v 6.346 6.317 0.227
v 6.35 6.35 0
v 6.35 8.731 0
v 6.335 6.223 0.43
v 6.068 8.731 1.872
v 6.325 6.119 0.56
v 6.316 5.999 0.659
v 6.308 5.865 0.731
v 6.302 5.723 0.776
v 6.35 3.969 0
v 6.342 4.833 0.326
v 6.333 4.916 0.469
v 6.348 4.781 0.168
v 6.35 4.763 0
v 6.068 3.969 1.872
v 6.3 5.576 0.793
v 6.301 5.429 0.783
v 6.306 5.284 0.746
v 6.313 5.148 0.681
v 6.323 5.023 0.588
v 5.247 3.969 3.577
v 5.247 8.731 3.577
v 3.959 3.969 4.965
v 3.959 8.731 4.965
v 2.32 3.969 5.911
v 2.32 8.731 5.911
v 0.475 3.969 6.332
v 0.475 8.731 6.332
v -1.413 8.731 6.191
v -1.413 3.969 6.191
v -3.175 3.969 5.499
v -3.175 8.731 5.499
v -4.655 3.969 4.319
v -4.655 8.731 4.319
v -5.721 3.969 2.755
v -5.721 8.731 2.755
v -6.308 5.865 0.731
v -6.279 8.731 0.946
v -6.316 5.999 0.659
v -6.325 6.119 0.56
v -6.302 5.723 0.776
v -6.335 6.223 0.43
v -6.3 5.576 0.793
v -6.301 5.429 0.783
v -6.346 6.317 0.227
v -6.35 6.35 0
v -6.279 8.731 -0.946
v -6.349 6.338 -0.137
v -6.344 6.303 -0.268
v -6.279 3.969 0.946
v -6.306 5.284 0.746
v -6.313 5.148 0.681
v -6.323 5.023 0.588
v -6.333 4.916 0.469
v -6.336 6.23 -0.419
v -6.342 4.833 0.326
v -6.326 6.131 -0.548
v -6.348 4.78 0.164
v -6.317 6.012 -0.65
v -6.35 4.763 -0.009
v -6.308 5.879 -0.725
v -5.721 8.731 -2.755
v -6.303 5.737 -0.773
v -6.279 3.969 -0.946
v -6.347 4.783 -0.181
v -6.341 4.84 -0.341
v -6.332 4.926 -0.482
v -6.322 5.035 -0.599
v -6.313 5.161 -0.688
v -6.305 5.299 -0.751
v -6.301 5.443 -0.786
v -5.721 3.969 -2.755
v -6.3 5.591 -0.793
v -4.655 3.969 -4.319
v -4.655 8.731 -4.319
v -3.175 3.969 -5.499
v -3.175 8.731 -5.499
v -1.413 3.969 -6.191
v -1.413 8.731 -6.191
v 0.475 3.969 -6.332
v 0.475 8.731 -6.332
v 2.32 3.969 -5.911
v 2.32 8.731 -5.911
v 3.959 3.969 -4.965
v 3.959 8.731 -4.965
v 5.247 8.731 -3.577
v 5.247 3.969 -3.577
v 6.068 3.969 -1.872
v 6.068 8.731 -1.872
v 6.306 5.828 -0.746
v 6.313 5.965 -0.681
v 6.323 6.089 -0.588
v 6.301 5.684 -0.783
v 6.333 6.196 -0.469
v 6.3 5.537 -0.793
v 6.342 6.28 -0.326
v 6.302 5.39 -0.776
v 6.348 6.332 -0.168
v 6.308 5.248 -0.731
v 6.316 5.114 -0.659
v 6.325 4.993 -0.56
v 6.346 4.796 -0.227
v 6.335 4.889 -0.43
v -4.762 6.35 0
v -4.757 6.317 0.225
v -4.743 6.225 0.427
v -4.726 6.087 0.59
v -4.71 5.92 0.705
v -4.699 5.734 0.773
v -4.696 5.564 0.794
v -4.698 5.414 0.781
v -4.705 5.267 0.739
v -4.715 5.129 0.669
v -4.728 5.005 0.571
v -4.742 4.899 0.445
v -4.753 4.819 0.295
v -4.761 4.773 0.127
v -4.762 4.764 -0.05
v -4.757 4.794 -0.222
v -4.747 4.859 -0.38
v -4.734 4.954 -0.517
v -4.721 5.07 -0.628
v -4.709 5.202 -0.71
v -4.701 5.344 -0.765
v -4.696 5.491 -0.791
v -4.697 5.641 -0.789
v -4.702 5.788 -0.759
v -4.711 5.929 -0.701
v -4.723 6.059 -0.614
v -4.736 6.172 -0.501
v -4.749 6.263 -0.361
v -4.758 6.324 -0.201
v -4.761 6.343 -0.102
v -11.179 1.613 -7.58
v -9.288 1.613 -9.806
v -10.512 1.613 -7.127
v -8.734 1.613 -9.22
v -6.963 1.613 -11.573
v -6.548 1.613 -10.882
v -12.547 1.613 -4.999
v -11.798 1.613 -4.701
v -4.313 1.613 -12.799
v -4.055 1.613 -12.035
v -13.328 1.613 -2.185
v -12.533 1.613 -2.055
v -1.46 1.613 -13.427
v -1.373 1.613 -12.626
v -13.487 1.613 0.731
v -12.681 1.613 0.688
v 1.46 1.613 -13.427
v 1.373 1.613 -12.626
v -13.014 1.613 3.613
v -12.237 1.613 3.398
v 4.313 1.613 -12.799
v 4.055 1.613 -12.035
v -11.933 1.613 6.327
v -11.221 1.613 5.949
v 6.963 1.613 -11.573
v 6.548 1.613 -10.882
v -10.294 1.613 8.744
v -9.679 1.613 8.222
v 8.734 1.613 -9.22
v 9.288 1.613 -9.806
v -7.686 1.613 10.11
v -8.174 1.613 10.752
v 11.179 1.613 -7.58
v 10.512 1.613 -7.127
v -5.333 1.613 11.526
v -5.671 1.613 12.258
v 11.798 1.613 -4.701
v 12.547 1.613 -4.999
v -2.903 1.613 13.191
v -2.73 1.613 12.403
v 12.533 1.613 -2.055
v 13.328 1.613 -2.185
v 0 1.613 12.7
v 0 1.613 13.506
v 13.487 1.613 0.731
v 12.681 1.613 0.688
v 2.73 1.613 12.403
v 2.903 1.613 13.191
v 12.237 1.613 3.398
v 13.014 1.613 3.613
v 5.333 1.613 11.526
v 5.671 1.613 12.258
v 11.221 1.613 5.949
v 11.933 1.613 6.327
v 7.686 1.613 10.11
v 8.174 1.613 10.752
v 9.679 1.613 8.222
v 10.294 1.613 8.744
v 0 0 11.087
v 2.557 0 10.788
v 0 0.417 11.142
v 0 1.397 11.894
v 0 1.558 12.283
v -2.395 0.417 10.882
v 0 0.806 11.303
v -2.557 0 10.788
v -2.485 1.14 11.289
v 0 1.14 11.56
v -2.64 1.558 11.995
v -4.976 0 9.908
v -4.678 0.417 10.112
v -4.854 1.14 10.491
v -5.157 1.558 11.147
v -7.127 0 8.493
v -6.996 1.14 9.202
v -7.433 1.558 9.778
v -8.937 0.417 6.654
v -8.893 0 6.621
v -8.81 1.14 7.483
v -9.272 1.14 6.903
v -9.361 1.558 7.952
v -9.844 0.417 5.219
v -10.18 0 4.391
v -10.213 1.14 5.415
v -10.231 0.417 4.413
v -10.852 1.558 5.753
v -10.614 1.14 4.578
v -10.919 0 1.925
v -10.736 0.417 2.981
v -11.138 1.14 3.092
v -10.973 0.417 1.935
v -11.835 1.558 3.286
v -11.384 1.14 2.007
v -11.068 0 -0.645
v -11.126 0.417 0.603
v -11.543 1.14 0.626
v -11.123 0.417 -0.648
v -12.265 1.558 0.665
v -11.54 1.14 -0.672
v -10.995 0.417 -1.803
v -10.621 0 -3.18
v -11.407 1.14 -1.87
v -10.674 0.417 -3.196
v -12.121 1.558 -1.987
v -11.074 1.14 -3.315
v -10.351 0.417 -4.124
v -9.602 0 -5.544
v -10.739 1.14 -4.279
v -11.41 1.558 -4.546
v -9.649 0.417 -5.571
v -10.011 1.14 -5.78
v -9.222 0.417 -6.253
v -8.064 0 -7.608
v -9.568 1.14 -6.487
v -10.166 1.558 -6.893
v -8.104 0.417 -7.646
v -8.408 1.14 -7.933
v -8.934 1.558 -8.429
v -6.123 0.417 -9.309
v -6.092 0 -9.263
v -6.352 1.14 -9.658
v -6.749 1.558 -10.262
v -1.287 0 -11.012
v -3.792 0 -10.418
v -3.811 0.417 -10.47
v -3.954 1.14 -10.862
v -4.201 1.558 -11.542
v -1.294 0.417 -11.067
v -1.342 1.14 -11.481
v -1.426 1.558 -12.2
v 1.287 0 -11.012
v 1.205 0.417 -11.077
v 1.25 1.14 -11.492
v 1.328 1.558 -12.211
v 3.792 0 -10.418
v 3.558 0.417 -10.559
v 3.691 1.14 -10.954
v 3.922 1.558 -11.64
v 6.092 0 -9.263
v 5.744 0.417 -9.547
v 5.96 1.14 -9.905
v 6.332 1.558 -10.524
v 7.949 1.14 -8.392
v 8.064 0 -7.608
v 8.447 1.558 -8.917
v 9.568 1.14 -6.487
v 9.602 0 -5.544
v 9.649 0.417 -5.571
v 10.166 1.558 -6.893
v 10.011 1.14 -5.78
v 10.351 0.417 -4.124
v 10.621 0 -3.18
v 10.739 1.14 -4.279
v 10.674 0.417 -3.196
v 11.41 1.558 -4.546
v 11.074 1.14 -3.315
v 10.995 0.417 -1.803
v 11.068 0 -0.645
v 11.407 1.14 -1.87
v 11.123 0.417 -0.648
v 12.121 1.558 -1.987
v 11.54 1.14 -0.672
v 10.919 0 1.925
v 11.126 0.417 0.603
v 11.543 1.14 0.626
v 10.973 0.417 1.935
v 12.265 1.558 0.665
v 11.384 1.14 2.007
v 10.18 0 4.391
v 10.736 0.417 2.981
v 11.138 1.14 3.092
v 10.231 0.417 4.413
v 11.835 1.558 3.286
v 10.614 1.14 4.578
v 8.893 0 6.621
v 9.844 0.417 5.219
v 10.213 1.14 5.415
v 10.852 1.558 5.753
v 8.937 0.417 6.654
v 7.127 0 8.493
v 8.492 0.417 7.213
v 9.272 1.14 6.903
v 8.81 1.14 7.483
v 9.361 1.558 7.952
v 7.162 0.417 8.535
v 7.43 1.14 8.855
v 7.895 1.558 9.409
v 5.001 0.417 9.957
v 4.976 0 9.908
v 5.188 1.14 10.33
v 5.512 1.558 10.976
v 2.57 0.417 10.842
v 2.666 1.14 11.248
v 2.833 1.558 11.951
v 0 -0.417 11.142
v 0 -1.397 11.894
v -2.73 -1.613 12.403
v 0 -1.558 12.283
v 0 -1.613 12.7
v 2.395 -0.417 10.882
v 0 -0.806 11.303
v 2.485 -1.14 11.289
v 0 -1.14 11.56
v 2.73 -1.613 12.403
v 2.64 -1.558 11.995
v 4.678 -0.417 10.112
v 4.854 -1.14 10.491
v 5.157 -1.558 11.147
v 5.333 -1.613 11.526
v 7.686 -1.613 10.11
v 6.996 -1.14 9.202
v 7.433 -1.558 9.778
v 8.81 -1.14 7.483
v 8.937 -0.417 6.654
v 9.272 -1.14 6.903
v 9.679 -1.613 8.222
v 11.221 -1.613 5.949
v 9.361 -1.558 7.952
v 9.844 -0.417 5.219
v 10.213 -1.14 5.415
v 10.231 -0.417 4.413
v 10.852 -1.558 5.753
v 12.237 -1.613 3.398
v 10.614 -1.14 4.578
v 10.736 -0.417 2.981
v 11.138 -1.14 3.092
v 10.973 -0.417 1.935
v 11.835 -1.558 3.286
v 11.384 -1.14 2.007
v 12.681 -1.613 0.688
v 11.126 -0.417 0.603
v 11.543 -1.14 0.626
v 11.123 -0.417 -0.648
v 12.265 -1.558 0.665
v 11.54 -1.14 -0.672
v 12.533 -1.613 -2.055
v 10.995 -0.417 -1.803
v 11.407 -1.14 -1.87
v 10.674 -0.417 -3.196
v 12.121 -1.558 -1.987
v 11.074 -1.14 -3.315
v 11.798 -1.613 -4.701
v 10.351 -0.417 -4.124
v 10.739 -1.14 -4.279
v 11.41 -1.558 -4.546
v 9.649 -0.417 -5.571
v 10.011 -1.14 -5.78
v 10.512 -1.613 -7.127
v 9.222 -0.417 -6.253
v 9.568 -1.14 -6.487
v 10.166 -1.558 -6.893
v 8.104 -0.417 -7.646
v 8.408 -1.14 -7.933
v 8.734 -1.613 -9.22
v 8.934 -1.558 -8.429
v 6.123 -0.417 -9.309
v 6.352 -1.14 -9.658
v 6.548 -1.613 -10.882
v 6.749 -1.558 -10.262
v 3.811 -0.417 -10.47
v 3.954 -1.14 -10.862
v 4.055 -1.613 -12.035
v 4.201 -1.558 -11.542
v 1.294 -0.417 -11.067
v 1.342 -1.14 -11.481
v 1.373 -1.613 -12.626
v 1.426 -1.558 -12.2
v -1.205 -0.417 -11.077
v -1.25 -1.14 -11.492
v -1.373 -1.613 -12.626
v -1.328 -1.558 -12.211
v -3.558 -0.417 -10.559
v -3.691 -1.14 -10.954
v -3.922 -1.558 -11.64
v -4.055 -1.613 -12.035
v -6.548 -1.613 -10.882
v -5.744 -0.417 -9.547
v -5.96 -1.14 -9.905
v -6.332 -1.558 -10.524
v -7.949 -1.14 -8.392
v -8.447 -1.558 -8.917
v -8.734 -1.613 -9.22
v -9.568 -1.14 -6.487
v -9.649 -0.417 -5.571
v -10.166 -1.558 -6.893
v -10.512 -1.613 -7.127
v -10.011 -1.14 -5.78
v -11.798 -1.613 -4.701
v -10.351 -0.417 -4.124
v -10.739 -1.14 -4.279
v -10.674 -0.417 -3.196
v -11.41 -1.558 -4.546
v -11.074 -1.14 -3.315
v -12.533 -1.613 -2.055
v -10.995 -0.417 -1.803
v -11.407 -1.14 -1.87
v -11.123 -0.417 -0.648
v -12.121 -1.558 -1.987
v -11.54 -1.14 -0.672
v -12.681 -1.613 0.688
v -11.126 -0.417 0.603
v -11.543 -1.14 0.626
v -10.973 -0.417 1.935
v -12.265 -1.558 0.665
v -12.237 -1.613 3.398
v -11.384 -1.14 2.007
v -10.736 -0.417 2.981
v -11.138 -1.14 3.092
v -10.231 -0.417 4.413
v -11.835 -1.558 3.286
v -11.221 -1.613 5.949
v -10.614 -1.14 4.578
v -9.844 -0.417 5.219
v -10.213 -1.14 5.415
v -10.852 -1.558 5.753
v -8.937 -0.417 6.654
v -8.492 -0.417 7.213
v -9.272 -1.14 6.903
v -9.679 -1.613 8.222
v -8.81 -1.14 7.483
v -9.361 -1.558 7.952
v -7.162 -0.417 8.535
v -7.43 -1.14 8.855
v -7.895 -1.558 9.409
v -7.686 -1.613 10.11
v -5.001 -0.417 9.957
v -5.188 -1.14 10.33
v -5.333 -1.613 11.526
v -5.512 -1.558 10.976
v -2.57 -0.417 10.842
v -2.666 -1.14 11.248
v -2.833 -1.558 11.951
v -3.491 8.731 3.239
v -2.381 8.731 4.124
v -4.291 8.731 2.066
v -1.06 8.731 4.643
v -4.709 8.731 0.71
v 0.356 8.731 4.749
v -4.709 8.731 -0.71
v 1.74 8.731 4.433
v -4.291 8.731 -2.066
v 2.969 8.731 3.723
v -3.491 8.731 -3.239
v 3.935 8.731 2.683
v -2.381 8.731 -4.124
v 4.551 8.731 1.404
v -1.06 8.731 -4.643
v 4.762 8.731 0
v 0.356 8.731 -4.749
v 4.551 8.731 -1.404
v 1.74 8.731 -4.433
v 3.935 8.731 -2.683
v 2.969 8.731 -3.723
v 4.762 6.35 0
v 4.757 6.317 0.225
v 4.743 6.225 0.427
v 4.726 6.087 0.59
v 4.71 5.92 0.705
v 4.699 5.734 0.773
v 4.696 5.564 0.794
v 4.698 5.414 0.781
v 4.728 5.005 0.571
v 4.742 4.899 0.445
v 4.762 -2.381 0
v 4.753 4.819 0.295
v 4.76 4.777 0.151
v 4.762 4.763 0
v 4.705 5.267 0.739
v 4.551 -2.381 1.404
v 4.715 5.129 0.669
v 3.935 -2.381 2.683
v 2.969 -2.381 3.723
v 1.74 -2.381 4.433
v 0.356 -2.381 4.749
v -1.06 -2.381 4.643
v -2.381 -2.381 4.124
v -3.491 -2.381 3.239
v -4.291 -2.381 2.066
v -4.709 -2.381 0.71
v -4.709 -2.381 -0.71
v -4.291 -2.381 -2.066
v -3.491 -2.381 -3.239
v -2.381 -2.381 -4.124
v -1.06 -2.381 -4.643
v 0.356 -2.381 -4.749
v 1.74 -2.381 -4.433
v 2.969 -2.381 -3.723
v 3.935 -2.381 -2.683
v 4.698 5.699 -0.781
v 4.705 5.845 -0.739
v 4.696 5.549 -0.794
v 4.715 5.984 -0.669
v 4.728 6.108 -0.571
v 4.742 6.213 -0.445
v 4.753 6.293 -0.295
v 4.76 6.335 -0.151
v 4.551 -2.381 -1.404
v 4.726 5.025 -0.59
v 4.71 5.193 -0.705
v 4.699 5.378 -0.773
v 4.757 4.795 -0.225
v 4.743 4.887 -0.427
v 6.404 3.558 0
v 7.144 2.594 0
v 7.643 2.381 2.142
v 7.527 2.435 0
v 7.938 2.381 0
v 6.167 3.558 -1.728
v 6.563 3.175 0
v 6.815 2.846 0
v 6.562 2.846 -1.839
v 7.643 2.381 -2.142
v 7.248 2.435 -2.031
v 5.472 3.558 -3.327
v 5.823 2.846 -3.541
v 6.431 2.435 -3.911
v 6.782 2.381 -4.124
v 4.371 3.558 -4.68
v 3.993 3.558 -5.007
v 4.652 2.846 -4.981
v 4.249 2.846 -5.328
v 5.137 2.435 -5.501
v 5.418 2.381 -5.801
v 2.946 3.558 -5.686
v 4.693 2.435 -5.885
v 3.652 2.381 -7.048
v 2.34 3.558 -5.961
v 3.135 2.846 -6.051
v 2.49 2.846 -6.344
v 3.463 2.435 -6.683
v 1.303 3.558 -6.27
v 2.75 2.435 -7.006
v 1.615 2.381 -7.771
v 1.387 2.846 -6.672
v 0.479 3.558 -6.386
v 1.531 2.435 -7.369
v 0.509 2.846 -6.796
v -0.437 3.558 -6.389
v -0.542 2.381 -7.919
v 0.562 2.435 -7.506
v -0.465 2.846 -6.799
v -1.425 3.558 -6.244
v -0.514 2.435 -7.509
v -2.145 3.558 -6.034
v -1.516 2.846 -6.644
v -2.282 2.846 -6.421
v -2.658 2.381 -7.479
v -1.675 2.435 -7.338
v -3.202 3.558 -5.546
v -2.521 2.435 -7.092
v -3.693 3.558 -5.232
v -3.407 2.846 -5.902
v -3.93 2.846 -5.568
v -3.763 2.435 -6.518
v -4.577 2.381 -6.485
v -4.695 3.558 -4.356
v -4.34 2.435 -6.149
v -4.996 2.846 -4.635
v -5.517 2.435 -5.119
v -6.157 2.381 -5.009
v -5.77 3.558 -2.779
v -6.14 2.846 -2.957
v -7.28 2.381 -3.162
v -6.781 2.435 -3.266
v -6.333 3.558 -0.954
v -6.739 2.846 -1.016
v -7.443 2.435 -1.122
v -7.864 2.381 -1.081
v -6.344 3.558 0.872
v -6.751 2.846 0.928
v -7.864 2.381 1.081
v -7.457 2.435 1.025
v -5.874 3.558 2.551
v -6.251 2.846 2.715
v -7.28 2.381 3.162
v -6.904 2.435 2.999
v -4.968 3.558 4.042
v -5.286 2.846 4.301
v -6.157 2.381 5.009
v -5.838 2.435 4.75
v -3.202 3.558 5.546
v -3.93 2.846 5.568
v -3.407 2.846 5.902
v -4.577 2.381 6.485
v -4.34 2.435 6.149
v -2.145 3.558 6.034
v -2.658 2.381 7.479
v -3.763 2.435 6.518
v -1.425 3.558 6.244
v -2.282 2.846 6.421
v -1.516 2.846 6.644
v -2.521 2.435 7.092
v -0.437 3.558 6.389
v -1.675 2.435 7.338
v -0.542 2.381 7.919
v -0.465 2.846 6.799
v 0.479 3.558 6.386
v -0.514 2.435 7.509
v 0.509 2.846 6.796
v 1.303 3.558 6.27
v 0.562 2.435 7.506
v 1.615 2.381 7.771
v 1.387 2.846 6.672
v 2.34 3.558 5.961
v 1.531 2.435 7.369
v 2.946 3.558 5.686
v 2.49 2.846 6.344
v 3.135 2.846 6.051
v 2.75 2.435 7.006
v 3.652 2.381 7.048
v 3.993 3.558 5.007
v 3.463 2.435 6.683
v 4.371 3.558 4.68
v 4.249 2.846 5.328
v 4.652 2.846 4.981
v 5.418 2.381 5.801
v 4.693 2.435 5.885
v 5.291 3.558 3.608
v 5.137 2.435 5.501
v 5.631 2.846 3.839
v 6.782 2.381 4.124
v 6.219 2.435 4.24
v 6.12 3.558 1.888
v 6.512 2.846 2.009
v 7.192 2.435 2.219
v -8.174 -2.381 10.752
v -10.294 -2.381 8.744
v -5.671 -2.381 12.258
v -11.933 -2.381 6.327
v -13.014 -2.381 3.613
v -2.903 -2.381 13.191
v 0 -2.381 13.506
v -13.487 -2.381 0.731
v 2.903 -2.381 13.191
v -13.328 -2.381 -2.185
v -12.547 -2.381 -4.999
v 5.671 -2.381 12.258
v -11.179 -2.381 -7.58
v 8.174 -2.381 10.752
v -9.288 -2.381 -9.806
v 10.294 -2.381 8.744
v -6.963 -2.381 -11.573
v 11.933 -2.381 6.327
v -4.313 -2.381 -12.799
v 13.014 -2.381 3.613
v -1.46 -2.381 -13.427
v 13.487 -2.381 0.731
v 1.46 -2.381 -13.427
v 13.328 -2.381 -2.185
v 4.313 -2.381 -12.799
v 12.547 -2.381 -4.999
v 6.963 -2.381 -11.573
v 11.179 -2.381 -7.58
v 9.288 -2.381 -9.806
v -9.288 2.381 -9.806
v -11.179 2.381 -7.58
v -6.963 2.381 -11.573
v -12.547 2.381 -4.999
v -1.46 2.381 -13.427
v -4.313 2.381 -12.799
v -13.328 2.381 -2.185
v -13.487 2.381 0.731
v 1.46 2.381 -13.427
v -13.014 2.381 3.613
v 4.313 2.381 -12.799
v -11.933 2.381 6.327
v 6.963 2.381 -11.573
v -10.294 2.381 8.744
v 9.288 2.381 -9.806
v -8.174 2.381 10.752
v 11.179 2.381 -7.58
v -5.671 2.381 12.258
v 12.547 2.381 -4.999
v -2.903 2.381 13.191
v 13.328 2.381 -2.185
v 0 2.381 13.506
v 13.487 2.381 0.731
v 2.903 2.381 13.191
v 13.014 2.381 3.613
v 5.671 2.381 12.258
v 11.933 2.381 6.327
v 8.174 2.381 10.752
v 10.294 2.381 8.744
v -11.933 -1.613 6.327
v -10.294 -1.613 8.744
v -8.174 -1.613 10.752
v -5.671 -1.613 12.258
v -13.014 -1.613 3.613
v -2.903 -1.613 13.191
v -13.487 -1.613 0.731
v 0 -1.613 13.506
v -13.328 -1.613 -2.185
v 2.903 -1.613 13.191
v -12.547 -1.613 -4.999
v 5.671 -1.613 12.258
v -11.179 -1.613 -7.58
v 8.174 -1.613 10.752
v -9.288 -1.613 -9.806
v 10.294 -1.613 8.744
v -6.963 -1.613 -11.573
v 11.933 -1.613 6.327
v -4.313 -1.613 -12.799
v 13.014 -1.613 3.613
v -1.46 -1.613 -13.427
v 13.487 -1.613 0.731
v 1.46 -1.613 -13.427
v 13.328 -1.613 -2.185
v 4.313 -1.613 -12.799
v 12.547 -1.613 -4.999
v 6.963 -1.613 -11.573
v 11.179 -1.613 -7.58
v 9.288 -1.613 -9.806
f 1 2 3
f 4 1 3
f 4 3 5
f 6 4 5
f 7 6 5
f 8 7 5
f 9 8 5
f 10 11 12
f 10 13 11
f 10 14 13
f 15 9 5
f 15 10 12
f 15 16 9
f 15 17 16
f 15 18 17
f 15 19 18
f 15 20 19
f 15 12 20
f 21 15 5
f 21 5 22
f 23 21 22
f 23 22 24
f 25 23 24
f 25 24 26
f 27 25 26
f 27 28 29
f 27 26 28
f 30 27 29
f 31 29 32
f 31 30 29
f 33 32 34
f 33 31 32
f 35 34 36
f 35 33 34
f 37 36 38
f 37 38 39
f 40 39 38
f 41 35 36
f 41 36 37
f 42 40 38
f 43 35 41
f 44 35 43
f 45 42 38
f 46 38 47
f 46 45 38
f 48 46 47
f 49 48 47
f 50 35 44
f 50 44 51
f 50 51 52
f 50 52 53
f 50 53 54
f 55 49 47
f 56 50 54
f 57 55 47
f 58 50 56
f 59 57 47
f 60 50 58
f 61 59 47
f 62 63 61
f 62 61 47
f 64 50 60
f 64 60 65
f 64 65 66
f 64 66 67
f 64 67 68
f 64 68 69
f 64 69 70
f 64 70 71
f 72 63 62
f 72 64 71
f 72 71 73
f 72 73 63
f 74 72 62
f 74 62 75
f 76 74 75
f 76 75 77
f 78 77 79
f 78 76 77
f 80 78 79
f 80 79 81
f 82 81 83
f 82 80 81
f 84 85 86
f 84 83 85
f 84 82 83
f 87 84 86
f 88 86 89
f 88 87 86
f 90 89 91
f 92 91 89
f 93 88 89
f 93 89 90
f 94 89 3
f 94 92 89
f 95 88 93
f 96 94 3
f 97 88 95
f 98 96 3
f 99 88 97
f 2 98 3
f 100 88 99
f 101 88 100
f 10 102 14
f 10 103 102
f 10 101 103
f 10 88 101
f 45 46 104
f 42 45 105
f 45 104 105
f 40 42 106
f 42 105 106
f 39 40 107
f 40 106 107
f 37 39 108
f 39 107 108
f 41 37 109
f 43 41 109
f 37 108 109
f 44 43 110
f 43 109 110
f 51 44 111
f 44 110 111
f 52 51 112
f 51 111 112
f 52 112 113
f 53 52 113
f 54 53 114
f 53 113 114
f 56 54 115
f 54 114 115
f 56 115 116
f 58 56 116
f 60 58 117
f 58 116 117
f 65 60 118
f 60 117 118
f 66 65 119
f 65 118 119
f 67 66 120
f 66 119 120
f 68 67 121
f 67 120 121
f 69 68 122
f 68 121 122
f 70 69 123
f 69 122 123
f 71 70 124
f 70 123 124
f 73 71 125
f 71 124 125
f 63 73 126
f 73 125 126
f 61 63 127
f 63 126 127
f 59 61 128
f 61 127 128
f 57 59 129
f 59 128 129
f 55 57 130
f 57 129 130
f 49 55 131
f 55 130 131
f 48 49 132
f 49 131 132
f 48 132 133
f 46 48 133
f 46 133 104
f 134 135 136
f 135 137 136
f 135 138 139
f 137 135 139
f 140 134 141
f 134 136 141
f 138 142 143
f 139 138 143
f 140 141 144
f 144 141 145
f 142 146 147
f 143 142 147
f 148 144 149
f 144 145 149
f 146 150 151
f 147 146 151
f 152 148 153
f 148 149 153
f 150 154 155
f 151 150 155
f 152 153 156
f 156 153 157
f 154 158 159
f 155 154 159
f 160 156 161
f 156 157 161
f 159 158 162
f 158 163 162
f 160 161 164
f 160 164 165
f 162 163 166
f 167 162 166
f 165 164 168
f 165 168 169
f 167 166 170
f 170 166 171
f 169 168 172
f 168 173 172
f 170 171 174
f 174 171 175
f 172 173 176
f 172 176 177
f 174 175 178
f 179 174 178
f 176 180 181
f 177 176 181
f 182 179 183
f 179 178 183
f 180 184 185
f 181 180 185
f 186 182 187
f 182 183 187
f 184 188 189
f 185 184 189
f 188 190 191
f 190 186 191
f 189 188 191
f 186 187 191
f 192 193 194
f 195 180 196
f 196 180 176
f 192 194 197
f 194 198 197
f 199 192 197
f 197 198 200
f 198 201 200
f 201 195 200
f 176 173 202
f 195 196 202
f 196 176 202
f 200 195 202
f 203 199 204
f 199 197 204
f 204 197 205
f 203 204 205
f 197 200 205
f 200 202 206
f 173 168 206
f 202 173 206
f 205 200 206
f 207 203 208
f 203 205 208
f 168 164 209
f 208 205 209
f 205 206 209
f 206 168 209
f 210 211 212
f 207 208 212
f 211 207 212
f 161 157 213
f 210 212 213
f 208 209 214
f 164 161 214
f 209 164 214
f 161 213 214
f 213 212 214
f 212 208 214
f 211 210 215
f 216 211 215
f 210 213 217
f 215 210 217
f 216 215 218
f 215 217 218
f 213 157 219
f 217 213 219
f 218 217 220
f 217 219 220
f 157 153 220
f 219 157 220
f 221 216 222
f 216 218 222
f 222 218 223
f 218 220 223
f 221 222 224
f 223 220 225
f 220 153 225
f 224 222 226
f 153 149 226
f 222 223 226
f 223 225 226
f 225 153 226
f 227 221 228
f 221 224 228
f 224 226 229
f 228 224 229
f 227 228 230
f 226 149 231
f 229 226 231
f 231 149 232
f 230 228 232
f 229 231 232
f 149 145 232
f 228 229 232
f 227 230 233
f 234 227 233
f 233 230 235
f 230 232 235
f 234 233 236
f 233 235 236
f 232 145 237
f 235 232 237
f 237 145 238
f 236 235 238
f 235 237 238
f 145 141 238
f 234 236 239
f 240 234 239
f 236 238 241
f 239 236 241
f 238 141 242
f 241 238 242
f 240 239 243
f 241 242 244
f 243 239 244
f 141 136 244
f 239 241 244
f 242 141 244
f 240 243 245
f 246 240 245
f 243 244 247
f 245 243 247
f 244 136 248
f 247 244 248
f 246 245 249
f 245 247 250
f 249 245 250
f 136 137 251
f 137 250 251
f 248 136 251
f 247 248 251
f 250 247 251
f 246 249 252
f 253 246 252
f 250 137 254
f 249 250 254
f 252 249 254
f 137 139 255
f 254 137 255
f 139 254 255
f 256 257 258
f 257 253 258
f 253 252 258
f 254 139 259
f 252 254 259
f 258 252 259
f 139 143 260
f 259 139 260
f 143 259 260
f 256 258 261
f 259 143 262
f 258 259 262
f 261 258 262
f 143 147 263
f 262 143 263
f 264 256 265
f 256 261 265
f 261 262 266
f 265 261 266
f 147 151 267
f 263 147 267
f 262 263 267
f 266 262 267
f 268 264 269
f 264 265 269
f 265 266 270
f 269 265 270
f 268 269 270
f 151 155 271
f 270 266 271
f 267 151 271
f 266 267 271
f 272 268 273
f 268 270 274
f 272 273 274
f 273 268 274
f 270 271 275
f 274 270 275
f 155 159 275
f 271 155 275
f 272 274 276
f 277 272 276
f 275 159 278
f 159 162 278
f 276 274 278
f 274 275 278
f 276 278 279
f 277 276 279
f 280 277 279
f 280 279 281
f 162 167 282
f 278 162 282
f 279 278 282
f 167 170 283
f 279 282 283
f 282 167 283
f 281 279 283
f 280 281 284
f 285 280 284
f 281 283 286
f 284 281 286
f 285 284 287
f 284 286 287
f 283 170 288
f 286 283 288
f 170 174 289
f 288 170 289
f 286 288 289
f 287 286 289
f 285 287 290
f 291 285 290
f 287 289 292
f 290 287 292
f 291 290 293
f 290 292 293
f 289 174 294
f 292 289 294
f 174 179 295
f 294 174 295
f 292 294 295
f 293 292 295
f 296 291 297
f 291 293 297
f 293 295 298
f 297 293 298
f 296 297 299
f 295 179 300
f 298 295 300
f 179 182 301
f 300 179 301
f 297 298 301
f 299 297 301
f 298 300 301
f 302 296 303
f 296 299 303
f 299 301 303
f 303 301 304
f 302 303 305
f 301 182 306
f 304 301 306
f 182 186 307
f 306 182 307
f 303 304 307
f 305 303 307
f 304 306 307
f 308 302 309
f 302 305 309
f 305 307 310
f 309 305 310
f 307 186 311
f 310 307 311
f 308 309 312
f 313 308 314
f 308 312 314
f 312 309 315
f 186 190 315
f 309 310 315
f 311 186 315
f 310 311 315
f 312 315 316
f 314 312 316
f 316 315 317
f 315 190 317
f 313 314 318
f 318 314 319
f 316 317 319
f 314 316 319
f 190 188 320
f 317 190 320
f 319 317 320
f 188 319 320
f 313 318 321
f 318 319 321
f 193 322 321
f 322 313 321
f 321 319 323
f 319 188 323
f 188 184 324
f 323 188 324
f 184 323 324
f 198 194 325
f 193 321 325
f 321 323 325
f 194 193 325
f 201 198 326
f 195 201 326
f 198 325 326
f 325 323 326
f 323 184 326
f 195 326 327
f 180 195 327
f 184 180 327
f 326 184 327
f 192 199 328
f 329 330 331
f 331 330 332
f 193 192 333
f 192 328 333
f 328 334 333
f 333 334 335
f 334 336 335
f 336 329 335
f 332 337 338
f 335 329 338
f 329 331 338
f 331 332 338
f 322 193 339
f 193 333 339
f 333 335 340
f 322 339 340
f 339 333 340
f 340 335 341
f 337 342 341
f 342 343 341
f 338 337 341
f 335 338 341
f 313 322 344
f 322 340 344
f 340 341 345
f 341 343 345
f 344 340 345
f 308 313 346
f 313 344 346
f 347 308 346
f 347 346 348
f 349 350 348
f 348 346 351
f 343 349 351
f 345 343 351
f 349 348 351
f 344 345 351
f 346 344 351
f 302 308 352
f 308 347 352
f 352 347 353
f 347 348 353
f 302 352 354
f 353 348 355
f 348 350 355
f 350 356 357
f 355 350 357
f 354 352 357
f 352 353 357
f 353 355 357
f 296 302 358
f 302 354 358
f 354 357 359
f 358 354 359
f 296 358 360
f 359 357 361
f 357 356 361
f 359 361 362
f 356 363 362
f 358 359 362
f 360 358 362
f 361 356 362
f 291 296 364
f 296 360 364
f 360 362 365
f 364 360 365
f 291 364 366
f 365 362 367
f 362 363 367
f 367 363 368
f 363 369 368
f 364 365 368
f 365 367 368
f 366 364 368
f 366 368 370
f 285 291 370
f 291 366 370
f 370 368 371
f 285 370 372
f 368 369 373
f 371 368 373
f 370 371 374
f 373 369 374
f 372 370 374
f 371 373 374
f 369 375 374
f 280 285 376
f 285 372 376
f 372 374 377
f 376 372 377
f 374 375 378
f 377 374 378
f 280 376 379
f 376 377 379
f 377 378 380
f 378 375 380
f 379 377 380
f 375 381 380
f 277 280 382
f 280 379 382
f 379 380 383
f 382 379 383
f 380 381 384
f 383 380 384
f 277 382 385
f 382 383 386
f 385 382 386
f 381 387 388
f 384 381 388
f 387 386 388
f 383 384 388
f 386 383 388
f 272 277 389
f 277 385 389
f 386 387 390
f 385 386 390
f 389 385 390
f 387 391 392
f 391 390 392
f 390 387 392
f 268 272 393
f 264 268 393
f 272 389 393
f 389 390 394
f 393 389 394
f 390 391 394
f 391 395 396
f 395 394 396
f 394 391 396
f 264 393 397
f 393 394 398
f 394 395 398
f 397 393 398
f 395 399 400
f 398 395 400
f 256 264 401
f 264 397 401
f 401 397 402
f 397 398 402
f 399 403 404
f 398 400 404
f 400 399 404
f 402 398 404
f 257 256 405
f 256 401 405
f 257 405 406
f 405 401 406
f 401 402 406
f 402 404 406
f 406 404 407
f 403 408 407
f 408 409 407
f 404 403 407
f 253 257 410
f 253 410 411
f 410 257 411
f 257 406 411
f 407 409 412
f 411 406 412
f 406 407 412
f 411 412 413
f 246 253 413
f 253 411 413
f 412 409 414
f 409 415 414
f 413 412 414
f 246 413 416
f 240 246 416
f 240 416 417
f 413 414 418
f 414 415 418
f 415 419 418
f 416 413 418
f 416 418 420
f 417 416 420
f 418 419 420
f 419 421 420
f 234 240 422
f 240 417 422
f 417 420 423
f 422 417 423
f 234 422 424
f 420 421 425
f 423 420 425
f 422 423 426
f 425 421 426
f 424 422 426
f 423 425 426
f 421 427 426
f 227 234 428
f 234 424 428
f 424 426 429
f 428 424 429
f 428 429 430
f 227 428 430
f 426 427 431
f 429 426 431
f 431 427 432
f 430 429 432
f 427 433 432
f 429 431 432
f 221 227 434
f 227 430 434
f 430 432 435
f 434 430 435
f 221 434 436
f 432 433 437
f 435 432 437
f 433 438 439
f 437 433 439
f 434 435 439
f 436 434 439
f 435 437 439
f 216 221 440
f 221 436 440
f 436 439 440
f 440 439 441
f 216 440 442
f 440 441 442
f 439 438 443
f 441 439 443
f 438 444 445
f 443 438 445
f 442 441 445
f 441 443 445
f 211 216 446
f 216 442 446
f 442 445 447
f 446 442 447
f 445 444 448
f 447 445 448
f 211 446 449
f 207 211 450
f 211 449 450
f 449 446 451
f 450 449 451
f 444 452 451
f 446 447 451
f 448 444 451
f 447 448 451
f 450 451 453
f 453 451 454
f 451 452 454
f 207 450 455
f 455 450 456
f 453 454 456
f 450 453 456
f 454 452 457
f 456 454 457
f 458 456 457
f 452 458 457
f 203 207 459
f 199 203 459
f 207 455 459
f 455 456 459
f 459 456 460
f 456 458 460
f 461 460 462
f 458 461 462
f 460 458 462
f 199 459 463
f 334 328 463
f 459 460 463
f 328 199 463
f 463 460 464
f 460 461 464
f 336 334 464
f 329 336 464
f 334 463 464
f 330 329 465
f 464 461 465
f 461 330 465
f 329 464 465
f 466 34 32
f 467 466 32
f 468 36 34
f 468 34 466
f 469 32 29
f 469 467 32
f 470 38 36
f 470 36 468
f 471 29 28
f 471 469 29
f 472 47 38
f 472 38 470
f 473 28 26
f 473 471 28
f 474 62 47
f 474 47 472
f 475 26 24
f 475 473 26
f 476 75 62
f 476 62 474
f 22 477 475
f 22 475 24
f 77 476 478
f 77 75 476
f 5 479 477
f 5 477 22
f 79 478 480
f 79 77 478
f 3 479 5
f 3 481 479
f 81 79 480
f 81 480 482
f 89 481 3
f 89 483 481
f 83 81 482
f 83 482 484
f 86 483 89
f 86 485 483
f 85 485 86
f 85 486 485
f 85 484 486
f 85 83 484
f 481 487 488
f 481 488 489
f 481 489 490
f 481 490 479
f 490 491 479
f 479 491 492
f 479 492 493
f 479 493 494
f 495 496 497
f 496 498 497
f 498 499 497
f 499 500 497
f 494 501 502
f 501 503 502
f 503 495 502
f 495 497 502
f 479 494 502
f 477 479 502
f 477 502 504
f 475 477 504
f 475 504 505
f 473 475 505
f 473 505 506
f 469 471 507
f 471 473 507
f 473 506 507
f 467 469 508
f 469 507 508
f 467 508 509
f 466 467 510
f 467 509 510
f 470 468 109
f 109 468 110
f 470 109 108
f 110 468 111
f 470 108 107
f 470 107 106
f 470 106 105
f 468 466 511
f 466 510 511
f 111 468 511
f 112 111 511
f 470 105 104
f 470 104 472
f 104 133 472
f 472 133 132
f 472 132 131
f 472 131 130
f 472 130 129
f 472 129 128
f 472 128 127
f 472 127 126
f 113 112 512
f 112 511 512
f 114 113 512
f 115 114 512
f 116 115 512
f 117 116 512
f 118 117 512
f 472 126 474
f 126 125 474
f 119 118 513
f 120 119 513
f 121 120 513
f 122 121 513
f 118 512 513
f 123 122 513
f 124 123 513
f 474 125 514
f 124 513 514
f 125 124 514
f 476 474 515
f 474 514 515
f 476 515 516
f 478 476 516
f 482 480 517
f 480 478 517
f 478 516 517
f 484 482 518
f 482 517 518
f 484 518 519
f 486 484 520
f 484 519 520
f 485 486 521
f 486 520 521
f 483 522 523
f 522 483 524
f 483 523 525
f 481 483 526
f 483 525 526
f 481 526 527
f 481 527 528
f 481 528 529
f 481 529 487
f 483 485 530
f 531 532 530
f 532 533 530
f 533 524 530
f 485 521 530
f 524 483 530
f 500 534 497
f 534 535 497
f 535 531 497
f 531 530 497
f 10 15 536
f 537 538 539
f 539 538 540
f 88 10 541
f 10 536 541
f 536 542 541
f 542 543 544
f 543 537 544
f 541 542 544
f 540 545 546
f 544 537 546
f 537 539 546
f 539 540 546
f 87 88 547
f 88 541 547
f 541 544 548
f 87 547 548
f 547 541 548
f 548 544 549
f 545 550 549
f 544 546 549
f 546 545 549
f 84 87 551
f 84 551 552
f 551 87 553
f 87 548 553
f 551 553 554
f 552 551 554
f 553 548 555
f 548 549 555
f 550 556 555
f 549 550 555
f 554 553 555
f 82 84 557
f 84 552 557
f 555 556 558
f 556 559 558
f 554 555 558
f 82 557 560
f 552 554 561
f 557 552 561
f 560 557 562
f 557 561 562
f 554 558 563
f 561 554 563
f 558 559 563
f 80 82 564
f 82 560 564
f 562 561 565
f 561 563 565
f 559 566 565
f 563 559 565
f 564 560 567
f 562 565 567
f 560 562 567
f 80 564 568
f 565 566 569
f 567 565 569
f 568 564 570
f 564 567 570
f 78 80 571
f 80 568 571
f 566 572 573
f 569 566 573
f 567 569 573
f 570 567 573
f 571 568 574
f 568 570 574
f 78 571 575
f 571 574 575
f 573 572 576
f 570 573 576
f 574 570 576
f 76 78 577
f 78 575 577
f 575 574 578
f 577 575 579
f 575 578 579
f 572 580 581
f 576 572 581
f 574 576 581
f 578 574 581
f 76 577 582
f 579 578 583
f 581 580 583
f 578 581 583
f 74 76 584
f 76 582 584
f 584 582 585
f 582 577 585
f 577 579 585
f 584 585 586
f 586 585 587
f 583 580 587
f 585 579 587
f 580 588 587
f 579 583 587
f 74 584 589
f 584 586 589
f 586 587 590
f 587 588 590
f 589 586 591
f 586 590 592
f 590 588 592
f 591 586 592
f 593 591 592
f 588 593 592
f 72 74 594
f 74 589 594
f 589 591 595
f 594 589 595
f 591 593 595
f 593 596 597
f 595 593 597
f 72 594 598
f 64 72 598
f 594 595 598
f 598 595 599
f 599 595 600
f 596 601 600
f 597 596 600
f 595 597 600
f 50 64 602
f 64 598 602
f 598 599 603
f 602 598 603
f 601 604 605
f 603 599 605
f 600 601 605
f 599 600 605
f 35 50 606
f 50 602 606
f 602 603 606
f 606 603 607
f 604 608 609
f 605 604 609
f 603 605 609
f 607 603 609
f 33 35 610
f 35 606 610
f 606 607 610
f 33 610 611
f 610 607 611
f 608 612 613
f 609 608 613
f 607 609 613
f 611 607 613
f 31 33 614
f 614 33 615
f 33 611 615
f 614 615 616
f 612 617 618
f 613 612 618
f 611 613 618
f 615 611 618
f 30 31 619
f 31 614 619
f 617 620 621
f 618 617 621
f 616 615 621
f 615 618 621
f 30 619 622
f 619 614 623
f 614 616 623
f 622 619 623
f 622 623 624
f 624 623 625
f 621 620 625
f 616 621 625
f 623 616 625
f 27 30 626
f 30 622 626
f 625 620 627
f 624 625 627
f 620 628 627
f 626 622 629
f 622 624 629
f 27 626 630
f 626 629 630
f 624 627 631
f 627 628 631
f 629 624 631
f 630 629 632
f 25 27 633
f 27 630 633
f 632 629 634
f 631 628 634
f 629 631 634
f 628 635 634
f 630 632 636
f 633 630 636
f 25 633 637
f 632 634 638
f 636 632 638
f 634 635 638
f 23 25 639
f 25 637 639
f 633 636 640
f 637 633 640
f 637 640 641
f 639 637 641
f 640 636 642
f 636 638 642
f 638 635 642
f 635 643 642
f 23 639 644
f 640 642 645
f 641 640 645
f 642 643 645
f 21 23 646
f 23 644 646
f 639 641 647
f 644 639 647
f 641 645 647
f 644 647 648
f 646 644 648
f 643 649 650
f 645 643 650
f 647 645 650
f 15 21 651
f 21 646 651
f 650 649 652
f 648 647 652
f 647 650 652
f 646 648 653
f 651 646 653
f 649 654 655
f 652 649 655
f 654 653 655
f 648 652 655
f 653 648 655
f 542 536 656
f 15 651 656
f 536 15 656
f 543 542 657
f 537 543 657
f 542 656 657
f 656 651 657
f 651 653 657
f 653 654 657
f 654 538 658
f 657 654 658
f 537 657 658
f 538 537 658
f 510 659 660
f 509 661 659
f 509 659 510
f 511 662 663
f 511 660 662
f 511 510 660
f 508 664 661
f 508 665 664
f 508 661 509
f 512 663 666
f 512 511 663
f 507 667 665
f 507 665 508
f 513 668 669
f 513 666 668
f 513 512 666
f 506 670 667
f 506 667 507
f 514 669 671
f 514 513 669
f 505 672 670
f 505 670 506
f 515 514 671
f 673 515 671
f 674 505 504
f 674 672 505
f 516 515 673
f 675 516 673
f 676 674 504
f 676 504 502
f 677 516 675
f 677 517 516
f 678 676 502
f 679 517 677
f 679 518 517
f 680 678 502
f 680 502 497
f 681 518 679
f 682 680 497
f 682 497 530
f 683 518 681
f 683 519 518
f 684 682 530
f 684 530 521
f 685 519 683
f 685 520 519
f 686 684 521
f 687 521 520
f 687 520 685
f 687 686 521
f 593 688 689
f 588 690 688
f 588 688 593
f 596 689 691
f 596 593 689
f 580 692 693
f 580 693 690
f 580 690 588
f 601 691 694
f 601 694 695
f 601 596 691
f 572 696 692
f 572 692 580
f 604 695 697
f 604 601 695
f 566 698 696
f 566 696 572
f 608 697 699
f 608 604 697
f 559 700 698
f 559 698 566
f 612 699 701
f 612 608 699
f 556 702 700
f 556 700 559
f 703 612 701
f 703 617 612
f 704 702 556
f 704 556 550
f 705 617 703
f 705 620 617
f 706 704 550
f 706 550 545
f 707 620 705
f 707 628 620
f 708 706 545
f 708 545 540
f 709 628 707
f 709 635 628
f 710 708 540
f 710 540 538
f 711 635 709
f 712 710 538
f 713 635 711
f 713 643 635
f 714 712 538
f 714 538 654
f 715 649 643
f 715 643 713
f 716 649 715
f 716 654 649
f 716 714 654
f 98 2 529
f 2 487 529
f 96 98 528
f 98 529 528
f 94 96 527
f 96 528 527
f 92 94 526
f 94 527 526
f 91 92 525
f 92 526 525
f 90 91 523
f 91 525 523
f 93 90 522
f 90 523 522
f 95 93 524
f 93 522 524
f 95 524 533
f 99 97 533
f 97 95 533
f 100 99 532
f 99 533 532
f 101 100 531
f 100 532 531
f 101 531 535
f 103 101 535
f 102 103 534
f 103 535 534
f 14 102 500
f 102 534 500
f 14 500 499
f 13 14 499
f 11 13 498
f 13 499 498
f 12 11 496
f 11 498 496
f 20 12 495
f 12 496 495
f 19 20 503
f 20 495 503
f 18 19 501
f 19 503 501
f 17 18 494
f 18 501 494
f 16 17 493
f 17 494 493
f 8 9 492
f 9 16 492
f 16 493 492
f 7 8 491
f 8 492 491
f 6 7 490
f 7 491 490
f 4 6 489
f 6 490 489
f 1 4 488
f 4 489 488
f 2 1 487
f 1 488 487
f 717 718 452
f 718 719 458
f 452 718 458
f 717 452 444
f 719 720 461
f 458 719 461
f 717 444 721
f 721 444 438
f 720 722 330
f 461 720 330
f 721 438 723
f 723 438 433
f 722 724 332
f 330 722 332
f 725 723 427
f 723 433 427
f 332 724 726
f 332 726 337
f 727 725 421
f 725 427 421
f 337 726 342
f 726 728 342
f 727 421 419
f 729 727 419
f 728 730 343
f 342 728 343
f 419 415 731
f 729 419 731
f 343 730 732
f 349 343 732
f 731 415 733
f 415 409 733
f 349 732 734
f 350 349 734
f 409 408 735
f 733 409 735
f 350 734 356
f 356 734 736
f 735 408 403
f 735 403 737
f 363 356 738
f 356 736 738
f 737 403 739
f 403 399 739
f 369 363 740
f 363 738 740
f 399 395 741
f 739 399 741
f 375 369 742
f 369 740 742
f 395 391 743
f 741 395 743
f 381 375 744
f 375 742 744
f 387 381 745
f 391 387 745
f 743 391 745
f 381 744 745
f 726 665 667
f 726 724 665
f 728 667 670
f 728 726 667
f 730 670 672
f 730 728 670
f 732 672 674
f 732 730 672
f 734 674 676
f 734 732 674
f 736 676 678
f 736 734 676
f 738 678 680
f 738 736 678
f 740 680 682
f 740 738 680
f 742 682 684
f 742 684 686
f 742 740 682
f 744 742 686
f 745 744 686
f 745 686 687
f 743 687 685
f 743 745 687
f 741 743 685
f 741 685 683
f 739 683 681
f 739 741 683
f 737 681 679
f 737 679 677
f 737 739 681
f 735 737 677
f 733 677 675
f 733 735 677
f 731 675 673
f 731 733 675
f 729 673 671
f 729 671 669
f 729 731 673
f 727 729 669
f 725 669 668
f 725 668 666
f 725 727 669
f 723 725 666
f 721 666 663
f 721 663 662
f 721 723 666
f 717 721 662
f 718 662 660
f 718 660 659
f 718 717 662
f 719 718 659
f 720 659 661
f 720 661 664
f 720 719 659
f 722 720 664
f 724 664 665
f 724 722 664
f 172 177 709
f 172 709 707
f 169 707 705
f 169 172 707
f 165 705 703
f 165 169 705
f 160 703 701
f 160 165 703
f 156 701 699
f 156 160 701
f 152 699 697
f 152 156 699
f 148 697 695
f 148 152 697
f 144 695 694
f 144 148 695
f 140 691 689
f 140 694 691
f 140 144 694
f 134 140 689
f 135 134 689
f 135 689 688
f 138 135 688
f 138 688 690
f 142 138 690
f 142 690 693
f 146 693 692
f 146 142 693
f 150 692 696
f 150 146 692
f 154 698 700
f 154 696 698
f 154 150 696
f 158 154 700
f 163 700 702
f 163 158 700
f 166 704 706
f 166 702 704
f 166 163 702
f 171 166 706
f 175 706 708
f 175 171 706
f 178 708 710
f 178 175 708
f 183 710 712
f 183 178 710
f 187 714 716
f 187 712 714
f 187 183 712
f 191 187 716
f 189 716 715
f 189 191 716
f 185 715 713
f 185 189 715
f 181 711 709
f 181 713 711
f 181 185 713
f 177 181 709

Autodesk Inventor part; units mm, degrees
ref_plane "YZ Plane" through (0, 0, 0) normal (1, 0, 0) x (0, 1, 0)
ref_plane "XZ Plane" through (0, 0, 0) normal (0, 1, 0) x (-1, 0, 0)
ref_plane "XY Plane" through (0, 0, 0) normal (0, 0, 1) x (1, 0, 0)
sketch "Sketch1" plane through (0, 0, 0) normal (1, 0, 0) x (0, 1, 0)
  line L0 (-2.3813, 13.5064) -> (-2.3813, 0) construction
  line L1 (-2.3813, 0) -> (0, 0) construction
  line L2 (2.3813, 0) -> (2.3813, 13.5064)
  line L3 (2.3813, 13.5064) -> (0, 13.5064)
  line L4 (-2.3813, 13.5064) -> (2.3813, 0) construction
  line L5 (-2.3813, 0) -> (2.3813, 13.5064) construction
  line L6 (0, 12.7) -> (0, 11.0871)
  line L7 (0, 11.0871) -> (0, 13.5064)
  line L8 (0, 13.5064) -> (-2.3813, 13.5064) construction
  line L9 (0, 0) -> (2.3813, 0)
  line L10 (0, 11.0871) -> (0, 0)
  arc A0 (0, 11.0871) -> (1.6129, 12.7) centre (0, 12.7) ccw
  line L11 (1.6129, 12.7) -> (1.6129, 13.5064)
  point P0 (0, 6.7532)
  point P1 (0, 6.7532)
  dimension "d2" = 1.6129
  dimension "d4" = 2.3813
  dimension "d5" = 0.8065
  dimension "d16" = 12.7
revolve "Revolution1" add sketch "Sketch1" angle 360 about axis through (0, 0, 0) along (0, 1, 0) contours L9 L10 A0 L11 L3 L2
mirror "Mirror1" about plane through (0, 0, 11.0871) normal (0, -1, 0) of "Revolution1"
sketch "Sketch2" plane through (0, -2.3813, 0) normal (0, -1, 0) x (1, 0, 0)
  circle A0 centre (0, 0) radius 4.7625
  point P0 (0, 0)
  dimension "d7" = 9.525
extrude "Extrusion1" cut sketch "Sketch2" against normal through all
sketch "Sketch3" plane through (0, 2.3813, 0) normal (0, 1, 0) x (1, 0, 0)
  circle A0 centre (0, 0) radius 4.7625 projected
  circle A1 centre (0, 0) radius 6.35
  dimension "d10" = 1.5875
extrude "Extrusion2" add sketch "Sketch3" along normal blind 6.35
sketch "Sketch4" plane through (0, 0, 0) normal (1, 0, 0) x (0, 1, 0)
  circle A0 centre (5.5563, 0) radius 0.7937
  line L0 (8.7312, -6.35) -> (8.7313, 6.35) construction
  line L1 (2.3813, 6.35) -> (2.3812, -6.35) construction
  line L2 (8.7312, -6.35) -> (8.7313, 6.35) projected
  line L3 (2.3813, 6.35) -> (8.7312, -6.35) construction
  point P0 (0, 0)
  dimension "d13" = 1.5875
extrude "Extrusion3" cut sketch "Sketch4" along normal through all both and the other way through all
fillet "Fillet1" radius 1.5875 1 edges at (-6.35, 2.3813, 0)
equation "\"d5\" = 0.5 * d2"
properties part number "0.5OD_Pulley" material "ABS Plastic"
